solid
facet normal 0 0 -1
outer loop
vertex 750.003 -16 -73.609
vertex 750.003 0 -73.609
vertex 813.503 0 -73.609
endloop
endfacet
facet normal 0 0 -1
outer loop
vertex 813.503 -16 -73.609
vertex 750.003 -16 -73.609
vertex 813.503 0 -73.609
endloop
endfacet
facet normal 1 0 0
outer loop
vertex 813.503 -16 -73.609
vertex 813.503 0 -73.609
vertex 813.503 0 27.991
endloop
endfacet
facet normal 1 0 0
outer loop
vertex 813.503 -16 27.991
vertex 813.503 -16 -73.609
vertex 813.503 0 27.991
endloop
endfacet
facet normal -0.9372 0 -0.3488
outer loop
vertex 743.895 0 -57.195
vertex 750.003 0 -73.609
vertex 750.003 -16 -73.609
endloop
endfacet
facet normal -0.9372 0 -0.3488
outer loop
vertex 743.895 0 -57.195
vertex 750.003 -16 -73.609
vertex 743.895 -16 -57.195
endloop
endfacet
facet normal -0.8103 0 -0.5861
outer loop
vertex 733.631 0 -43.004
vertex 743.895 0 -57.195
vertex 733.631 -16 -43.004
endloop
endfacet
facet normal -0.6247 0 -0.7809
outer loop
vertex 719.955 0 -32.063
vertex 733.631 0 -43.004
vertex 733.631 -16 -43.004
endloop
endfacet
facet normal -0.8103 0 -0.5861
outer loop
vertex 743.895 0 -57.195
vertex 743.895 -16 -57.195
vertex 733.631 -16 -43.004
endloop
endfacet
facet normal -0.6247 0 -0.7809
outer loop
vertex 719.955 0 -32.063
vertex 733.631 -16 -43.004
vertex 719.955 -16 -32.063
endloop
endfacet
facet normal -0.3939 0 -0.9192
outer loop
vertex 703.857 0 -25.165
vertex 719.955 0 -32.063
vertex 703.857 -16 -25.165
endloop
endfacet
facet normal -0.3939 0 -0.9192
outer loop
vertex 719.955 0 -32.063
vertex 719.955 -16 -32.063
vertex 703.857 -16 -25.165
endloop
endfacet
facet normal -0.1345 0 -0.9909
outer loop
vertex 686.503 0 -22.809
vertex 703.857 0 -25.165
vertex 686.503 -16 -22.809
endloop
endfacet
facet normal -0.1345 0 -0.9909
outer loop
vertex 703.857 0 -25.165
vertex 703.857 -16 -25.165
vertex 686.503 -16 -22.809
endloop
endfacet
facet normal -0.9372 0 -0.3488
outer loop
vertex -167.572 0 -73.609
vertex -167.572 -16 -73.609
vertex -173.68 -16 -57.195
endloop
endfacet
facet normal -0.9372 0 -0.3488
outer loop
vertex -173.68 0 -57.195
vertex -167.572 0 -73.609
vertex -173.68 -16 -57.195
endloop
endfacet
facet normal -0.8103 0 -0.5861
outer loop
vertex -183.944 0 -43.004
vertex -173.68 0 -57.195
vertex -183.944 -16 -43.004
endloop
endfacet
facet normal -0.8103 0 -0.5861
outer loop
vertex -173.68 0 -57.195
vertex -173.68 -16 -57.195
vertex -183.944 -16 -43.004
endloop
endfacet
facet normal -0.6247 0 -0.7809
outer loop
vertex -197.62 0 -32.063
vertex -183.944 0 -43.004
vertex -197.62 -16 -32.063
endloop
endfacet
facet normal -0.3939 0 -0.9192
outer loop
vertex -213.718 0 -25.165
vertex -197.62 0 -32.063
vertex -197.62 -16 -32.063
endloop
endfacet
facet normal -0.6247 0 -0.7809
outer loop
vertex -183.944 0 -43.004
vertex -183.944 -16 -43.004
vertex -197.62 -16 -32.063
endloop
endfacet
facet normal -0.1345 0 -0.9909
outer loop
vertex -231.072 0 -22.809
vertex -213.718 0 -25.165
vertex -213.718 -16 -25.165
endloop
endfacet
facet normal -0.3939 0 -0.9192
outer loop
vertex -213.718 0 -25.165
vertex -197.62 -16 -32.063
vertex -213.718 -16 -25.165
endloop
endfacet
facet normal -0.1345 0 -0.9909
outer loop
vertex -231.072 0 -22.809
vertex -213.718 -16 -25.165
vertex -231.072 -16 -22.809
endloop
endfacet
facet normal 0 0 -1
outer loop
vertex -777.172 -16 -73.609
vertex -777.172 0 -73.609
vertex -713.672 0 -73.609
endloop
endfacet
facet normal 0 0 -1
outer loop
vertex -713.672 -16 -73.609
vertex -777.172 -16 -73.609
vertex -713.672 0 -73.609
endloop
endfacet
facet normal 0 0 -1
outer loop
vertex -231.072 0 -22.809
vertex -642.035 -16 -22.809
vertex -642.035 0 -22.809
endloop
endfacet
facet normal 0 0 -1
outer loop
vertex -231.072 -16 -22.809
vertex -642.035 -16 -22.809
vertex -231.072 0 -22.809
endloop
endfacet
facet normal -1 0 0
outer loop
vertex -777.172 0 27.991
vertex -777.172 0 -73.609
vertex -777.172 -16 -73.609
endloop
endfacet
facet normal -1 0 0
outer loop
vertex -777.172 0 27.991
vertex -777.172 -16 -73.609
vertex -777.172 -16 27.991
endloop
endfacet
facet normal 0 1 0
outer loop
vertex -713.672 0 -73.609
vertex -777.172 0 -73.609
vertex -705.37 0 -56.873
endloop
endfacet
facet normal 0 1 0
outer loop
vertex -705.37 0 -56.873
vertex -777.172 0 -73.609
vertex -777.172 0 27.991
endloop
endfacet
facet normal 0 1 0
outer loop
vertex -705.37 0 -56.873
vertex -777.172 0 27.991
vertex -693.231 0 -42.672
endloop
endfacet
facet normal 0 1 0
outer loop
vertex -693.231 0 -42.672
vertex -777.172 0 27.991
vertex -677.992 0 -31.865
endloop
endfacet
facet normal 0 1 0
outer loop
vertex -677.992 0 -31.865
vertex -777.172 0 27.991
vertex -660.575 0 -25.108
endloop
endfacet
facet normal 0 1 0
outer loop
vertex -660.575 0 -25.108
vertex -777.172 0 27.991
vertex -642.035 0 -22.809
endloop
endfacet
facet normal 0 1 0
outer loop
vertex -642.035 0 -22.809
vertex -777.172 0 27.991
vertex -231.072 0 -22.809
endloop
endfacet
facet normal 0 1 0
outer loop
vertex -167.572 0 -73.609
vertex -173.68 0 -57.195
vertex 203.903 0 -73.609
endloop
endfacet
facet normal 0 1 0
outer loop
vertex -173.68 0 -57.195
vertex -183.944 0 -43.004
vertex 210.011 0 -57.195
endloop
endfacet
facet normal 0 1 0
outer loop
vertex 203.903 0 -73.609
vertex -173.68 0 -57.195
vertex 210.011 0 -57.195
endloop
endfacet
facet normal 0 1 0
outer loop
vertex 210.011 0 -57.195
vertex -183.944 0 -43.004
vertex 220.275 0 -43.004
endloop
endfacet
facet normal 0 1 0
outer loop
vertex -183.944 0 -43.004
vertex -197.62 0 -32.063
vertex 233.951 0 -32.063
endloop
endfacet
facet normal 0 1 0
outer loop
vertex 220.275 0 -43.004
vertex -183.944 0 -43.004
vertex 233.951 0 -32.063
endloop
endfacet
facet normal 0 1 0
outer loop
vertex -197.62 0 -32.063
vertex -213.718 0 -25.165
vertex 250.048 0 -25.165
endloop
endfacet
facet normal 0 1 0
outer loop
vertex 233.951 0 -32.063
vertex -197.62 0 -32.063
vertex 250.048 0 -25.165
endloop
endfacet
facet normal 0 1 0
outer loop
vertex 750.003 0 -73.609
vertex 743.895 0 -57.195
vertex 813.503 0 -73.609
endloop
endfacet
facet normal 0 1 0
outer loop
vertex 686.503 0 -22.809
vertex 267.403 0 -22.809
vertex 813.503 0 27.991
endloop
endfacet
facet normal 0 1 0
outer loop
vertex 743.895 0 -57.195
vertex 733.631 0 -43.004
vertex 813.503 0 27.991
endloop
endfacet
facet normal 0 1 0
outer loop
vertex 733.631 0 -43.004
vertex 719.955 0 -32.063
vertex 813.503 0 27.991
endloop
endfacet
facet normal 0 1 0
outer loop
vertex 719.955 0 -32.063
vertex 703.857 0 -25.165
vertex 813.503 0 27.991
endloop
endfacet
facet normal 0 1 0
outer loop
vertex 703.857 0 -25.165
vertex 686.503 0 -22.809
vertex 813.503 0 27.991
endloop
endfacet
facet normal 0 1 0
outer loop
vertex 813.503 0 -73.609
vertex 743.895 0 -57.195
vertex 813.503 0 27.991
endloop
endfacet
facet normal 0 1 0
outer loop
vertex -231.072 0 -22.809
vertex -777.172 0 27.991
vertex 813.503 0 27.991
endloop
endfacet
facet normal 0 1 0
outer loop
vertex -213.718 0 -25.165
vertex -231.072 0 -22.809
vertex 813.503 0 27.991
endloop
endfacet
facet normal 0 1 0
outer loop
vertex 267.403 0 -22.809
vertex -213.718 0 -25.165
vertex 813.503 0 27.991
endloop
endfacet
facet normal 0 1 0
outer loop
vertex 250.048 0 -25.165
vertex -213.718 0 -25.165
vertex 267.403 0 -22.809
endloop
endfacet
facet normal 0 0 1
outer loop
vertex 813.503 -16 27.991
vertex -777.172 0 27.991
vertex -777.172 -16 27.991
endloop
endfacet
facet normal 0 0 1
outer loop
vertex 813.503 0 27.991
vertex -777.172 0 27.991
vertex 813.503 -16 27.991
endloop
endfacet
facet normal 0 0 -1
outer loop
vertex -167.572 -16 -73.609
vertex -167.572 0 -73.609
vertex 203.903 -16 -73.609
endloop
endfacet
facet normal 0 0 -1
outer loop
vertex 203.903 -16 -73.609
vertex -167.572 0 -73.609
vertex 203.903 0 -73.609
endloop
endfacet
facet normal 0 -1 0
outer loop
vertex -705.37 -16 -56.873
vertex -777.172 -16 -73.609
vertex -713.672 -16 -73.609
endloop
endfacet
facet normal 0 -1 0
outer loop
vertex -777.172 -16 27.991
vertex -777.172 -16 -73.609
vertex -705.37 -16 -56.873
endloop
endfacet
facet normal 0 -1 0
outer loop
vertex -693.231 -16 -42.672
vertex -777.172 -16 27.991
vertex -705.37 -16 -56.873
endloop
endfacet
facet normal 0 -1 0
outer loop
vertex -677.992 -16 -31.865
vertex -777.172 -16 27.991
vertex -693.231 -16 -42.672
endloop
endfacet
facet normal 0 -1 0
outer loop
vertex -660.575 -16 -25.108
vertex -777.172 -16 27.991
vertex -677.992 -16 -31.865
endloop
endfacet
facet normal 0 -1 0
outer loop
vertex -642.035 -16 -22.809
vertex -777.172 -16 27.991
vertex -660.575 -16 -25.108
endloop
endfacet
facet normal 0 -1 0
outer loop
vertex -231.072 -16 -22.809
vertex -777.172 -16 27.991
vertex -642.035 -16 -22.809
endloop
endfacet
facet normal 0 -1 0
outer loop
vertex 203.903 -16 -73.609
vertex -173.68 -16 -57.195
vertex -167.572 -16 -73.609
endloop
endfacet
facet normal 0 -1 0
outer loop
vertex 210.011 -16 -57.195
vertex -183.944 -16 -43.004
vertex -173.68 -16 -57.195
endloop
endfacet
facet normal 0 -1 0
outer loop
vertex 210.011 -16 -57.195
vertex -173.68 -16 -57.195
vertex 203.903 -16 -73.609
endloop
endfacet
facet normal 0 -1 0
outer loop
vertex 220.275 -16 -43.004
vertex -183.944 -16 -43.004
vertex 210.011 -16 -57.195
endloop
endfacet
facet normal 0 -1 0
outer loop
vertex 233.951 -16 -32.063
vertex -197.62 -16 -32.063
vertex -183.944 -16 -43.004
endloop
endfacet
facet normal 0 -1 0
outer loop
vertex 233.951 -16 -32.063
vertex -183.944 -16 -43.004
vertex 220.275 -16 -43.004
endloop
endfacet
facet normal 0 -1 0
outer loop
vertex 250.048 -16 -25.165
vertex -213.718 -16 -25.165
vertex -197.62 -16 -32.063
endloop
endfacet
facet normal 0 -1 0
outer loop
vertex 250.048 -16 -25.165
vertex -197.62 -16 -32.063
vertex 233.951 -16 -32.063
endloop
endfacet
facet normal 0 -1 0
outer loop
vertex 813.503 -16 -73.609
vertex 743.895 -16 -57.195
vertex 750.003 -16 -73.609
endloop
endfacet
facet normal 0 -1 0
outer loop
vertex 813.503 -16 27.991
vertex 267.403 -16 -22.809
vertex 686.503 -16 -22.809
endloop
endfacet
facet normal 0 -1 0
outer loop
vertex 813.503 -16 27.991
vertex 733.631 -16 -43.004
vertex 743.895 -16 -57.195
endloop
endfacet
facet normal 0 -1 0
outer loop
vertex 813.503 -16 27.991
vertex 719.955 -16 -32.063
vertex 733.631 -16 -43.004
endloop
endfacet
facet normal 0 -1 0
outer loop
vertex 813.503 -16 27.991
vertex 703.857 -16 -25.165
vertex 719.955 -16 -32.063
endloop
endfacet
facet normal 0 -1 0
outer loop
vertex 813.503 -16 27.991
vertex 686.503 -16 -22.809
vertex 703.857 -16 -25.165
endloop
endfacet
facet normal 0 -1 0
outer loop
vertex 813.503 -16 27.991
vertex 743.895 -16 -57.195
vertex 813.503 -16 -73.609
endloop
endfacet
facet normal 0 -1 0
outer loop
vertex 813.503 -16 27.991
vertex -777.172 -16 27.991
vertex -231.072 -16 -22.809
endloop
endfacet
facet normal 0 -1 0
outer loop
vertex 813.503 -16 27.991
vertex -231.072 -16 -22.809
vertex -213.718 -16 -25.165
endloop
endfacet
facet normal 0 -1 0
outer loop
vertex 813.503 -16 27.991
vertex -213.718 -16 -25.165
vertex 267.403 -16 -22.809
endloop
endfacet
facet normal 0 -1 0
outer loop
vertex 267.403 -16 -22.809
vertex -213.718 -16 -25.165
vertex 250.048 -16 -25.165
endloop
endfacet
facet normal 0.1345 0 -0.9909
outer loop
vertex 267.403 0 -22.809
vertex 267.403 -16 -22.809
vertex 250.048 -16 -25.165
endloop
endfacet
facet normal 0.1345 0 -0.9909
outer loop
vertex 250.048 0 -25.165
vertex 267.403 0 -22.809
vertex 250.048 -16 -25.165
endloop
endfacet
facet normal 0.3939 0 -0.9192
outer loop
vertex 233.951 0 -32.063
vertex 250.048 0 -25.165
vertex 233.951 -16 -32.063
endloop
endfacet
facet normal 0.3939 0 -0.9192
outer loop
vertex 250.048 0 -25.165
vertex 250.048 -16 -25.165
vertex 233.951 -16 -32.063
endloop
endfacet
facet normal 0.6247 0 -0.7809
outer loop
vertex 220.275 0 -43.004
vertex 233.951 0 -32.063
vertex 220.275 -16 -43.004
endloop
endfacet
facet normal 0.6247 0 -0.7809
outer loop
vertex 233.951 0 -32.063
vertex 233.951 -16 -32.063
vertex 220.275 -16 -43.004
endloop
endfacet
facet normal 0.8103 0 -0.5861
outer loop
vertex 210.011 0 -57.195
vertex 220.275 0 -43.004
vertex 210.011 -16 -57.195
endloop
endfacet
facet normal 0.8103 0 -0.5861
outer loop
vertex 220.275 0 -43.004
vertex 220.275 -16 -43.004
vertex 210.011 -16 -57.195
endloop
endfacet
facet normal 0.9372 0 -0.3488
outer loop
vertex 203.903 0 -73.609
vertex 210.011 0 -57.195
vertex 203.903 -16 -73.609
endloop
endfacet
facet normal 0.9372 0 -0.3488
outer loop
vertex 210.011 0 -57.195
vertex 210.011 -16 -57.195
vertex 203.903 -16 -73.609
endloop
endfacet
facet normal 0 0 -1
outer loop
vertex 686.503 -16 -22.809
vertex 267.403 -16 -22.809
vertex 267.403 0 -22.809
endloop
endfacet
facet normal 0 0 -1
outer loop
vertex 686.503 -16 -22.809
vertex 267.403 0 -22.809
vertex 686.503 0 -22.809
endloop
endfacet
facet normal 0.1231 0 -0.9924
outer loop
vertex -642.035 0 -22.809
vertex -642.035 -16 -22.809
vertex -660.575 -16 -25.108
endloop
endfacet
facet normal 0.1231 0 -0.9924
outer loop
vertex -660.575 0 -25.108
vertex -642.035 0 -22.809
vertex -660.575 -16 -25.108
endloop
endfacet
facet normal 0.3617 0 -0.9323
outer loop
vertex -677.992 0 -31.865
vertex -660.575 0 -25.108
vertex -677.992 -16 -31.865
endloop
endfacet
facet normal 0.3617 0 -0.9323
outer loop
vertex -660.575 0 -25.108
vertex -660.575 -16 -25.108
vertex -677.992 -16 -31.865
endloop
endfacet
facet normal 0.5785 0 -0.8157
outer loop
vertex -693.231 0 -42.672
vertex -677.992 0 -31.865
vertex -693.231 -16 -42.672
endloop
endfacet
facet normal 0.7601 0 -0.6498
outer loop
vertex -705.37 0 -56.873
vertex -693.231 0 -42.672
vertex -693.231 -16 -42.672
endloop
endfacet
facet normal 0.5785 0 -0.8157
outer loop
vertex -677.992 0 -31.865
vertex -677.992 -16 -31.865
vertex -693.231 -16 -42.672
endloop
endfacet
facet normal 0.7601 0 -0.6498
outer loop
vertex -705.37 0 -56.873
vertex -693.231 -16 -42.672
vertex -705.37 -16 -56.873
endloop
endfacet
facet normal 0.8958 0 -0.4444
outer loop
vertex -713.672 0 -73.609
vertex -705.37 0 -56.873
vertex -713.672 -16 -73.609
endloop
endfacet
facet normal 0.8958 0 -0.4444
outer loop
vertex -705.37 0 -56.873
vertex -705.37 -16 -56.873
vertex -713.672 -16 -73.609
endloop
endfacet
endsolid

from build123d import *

# Parameters (mm, degrees)
F0_W     = 1590.675
F0_H     = 101.6
F1_DEPTH = 16
F2_W     = 410.9626214183
F2_H     = 50.8
F2_W_2   = 419.1
F3_DEPTH = 25.4


with BuildPart() as f1:
    # F0 (on Front) → F1 (new body)
    with BuildSketch(Plane.XZ):
        with Locations((18.1653643548, -22.8088884252)):
            Rectangle(F0_W, F0_H)
    extrude(amount=F1_DEPTH)

    # F2 (on face) → F3 (cut)
    with BuildSketch(Plane.XZ.offset(16)):
        with BuildLine():
            Line((-642.0347570634, -73.6088884252), (-642.0347570634, -22.8088884252))
            ThreePointArc((-642.0347570634, -22.8088884252), (-685.9453309895, -36.797837184), (-713.6721356452, -73.6088884252))
            Line((-713.6721356452, -73.6088884252), (-642.0347570634, -73.6088884252))
        make_face()
        with Locations((-436.5534463543, -48.2088884252)):
            Rectangle(F2_W, F2_H)
        with BuildLine():
            Line((-231.0721356452, -73.6088884252), (-167.5721356452, -73.6088884252))
            ThreePointArc((-167.5721356452, -73.6088884252), (-190.4122967375, -37.0715897906), (-231.0721356452, -22.8088884252))
            Line((-231.0721356452, -22.8088884252), (-231.0721356452, -73.6088884252))
        make_face()
        with BuildLine():
            ThreePointArc((267.4028643548, -22.8088884252), (226.7430254472, -37.0715897906), (203.9028643548, -73.6088884252))
            Line((203.9028643548, -73.6088884252), (267.4028643548, -73.6088884252))
            Line((267.4028643548, -73.6088884252), (267.4028643548, -22.8088884252))
        make_face()
        with Locations((476.9528643548, -48.2088884252)):
            Rectangle(F2_W_2, F2_H)
        with BuildLine():
            ThreePointArc((750.0028643548, -73.6088884252), (727.1627032625, -37.0715897906), (686.5028643548, -22.8088884252))
            Line((686.5028643548, -22.8088884252), (686.5028643548, -73.6088884252))
            Line((686.5028643548, -73.6088884252), (750.0028643548, -73.6088884252))
        make_face()
    extrude(amount=-F3_DEPTH, mode=Mode.SUBTRACT)


solid = f1.part
